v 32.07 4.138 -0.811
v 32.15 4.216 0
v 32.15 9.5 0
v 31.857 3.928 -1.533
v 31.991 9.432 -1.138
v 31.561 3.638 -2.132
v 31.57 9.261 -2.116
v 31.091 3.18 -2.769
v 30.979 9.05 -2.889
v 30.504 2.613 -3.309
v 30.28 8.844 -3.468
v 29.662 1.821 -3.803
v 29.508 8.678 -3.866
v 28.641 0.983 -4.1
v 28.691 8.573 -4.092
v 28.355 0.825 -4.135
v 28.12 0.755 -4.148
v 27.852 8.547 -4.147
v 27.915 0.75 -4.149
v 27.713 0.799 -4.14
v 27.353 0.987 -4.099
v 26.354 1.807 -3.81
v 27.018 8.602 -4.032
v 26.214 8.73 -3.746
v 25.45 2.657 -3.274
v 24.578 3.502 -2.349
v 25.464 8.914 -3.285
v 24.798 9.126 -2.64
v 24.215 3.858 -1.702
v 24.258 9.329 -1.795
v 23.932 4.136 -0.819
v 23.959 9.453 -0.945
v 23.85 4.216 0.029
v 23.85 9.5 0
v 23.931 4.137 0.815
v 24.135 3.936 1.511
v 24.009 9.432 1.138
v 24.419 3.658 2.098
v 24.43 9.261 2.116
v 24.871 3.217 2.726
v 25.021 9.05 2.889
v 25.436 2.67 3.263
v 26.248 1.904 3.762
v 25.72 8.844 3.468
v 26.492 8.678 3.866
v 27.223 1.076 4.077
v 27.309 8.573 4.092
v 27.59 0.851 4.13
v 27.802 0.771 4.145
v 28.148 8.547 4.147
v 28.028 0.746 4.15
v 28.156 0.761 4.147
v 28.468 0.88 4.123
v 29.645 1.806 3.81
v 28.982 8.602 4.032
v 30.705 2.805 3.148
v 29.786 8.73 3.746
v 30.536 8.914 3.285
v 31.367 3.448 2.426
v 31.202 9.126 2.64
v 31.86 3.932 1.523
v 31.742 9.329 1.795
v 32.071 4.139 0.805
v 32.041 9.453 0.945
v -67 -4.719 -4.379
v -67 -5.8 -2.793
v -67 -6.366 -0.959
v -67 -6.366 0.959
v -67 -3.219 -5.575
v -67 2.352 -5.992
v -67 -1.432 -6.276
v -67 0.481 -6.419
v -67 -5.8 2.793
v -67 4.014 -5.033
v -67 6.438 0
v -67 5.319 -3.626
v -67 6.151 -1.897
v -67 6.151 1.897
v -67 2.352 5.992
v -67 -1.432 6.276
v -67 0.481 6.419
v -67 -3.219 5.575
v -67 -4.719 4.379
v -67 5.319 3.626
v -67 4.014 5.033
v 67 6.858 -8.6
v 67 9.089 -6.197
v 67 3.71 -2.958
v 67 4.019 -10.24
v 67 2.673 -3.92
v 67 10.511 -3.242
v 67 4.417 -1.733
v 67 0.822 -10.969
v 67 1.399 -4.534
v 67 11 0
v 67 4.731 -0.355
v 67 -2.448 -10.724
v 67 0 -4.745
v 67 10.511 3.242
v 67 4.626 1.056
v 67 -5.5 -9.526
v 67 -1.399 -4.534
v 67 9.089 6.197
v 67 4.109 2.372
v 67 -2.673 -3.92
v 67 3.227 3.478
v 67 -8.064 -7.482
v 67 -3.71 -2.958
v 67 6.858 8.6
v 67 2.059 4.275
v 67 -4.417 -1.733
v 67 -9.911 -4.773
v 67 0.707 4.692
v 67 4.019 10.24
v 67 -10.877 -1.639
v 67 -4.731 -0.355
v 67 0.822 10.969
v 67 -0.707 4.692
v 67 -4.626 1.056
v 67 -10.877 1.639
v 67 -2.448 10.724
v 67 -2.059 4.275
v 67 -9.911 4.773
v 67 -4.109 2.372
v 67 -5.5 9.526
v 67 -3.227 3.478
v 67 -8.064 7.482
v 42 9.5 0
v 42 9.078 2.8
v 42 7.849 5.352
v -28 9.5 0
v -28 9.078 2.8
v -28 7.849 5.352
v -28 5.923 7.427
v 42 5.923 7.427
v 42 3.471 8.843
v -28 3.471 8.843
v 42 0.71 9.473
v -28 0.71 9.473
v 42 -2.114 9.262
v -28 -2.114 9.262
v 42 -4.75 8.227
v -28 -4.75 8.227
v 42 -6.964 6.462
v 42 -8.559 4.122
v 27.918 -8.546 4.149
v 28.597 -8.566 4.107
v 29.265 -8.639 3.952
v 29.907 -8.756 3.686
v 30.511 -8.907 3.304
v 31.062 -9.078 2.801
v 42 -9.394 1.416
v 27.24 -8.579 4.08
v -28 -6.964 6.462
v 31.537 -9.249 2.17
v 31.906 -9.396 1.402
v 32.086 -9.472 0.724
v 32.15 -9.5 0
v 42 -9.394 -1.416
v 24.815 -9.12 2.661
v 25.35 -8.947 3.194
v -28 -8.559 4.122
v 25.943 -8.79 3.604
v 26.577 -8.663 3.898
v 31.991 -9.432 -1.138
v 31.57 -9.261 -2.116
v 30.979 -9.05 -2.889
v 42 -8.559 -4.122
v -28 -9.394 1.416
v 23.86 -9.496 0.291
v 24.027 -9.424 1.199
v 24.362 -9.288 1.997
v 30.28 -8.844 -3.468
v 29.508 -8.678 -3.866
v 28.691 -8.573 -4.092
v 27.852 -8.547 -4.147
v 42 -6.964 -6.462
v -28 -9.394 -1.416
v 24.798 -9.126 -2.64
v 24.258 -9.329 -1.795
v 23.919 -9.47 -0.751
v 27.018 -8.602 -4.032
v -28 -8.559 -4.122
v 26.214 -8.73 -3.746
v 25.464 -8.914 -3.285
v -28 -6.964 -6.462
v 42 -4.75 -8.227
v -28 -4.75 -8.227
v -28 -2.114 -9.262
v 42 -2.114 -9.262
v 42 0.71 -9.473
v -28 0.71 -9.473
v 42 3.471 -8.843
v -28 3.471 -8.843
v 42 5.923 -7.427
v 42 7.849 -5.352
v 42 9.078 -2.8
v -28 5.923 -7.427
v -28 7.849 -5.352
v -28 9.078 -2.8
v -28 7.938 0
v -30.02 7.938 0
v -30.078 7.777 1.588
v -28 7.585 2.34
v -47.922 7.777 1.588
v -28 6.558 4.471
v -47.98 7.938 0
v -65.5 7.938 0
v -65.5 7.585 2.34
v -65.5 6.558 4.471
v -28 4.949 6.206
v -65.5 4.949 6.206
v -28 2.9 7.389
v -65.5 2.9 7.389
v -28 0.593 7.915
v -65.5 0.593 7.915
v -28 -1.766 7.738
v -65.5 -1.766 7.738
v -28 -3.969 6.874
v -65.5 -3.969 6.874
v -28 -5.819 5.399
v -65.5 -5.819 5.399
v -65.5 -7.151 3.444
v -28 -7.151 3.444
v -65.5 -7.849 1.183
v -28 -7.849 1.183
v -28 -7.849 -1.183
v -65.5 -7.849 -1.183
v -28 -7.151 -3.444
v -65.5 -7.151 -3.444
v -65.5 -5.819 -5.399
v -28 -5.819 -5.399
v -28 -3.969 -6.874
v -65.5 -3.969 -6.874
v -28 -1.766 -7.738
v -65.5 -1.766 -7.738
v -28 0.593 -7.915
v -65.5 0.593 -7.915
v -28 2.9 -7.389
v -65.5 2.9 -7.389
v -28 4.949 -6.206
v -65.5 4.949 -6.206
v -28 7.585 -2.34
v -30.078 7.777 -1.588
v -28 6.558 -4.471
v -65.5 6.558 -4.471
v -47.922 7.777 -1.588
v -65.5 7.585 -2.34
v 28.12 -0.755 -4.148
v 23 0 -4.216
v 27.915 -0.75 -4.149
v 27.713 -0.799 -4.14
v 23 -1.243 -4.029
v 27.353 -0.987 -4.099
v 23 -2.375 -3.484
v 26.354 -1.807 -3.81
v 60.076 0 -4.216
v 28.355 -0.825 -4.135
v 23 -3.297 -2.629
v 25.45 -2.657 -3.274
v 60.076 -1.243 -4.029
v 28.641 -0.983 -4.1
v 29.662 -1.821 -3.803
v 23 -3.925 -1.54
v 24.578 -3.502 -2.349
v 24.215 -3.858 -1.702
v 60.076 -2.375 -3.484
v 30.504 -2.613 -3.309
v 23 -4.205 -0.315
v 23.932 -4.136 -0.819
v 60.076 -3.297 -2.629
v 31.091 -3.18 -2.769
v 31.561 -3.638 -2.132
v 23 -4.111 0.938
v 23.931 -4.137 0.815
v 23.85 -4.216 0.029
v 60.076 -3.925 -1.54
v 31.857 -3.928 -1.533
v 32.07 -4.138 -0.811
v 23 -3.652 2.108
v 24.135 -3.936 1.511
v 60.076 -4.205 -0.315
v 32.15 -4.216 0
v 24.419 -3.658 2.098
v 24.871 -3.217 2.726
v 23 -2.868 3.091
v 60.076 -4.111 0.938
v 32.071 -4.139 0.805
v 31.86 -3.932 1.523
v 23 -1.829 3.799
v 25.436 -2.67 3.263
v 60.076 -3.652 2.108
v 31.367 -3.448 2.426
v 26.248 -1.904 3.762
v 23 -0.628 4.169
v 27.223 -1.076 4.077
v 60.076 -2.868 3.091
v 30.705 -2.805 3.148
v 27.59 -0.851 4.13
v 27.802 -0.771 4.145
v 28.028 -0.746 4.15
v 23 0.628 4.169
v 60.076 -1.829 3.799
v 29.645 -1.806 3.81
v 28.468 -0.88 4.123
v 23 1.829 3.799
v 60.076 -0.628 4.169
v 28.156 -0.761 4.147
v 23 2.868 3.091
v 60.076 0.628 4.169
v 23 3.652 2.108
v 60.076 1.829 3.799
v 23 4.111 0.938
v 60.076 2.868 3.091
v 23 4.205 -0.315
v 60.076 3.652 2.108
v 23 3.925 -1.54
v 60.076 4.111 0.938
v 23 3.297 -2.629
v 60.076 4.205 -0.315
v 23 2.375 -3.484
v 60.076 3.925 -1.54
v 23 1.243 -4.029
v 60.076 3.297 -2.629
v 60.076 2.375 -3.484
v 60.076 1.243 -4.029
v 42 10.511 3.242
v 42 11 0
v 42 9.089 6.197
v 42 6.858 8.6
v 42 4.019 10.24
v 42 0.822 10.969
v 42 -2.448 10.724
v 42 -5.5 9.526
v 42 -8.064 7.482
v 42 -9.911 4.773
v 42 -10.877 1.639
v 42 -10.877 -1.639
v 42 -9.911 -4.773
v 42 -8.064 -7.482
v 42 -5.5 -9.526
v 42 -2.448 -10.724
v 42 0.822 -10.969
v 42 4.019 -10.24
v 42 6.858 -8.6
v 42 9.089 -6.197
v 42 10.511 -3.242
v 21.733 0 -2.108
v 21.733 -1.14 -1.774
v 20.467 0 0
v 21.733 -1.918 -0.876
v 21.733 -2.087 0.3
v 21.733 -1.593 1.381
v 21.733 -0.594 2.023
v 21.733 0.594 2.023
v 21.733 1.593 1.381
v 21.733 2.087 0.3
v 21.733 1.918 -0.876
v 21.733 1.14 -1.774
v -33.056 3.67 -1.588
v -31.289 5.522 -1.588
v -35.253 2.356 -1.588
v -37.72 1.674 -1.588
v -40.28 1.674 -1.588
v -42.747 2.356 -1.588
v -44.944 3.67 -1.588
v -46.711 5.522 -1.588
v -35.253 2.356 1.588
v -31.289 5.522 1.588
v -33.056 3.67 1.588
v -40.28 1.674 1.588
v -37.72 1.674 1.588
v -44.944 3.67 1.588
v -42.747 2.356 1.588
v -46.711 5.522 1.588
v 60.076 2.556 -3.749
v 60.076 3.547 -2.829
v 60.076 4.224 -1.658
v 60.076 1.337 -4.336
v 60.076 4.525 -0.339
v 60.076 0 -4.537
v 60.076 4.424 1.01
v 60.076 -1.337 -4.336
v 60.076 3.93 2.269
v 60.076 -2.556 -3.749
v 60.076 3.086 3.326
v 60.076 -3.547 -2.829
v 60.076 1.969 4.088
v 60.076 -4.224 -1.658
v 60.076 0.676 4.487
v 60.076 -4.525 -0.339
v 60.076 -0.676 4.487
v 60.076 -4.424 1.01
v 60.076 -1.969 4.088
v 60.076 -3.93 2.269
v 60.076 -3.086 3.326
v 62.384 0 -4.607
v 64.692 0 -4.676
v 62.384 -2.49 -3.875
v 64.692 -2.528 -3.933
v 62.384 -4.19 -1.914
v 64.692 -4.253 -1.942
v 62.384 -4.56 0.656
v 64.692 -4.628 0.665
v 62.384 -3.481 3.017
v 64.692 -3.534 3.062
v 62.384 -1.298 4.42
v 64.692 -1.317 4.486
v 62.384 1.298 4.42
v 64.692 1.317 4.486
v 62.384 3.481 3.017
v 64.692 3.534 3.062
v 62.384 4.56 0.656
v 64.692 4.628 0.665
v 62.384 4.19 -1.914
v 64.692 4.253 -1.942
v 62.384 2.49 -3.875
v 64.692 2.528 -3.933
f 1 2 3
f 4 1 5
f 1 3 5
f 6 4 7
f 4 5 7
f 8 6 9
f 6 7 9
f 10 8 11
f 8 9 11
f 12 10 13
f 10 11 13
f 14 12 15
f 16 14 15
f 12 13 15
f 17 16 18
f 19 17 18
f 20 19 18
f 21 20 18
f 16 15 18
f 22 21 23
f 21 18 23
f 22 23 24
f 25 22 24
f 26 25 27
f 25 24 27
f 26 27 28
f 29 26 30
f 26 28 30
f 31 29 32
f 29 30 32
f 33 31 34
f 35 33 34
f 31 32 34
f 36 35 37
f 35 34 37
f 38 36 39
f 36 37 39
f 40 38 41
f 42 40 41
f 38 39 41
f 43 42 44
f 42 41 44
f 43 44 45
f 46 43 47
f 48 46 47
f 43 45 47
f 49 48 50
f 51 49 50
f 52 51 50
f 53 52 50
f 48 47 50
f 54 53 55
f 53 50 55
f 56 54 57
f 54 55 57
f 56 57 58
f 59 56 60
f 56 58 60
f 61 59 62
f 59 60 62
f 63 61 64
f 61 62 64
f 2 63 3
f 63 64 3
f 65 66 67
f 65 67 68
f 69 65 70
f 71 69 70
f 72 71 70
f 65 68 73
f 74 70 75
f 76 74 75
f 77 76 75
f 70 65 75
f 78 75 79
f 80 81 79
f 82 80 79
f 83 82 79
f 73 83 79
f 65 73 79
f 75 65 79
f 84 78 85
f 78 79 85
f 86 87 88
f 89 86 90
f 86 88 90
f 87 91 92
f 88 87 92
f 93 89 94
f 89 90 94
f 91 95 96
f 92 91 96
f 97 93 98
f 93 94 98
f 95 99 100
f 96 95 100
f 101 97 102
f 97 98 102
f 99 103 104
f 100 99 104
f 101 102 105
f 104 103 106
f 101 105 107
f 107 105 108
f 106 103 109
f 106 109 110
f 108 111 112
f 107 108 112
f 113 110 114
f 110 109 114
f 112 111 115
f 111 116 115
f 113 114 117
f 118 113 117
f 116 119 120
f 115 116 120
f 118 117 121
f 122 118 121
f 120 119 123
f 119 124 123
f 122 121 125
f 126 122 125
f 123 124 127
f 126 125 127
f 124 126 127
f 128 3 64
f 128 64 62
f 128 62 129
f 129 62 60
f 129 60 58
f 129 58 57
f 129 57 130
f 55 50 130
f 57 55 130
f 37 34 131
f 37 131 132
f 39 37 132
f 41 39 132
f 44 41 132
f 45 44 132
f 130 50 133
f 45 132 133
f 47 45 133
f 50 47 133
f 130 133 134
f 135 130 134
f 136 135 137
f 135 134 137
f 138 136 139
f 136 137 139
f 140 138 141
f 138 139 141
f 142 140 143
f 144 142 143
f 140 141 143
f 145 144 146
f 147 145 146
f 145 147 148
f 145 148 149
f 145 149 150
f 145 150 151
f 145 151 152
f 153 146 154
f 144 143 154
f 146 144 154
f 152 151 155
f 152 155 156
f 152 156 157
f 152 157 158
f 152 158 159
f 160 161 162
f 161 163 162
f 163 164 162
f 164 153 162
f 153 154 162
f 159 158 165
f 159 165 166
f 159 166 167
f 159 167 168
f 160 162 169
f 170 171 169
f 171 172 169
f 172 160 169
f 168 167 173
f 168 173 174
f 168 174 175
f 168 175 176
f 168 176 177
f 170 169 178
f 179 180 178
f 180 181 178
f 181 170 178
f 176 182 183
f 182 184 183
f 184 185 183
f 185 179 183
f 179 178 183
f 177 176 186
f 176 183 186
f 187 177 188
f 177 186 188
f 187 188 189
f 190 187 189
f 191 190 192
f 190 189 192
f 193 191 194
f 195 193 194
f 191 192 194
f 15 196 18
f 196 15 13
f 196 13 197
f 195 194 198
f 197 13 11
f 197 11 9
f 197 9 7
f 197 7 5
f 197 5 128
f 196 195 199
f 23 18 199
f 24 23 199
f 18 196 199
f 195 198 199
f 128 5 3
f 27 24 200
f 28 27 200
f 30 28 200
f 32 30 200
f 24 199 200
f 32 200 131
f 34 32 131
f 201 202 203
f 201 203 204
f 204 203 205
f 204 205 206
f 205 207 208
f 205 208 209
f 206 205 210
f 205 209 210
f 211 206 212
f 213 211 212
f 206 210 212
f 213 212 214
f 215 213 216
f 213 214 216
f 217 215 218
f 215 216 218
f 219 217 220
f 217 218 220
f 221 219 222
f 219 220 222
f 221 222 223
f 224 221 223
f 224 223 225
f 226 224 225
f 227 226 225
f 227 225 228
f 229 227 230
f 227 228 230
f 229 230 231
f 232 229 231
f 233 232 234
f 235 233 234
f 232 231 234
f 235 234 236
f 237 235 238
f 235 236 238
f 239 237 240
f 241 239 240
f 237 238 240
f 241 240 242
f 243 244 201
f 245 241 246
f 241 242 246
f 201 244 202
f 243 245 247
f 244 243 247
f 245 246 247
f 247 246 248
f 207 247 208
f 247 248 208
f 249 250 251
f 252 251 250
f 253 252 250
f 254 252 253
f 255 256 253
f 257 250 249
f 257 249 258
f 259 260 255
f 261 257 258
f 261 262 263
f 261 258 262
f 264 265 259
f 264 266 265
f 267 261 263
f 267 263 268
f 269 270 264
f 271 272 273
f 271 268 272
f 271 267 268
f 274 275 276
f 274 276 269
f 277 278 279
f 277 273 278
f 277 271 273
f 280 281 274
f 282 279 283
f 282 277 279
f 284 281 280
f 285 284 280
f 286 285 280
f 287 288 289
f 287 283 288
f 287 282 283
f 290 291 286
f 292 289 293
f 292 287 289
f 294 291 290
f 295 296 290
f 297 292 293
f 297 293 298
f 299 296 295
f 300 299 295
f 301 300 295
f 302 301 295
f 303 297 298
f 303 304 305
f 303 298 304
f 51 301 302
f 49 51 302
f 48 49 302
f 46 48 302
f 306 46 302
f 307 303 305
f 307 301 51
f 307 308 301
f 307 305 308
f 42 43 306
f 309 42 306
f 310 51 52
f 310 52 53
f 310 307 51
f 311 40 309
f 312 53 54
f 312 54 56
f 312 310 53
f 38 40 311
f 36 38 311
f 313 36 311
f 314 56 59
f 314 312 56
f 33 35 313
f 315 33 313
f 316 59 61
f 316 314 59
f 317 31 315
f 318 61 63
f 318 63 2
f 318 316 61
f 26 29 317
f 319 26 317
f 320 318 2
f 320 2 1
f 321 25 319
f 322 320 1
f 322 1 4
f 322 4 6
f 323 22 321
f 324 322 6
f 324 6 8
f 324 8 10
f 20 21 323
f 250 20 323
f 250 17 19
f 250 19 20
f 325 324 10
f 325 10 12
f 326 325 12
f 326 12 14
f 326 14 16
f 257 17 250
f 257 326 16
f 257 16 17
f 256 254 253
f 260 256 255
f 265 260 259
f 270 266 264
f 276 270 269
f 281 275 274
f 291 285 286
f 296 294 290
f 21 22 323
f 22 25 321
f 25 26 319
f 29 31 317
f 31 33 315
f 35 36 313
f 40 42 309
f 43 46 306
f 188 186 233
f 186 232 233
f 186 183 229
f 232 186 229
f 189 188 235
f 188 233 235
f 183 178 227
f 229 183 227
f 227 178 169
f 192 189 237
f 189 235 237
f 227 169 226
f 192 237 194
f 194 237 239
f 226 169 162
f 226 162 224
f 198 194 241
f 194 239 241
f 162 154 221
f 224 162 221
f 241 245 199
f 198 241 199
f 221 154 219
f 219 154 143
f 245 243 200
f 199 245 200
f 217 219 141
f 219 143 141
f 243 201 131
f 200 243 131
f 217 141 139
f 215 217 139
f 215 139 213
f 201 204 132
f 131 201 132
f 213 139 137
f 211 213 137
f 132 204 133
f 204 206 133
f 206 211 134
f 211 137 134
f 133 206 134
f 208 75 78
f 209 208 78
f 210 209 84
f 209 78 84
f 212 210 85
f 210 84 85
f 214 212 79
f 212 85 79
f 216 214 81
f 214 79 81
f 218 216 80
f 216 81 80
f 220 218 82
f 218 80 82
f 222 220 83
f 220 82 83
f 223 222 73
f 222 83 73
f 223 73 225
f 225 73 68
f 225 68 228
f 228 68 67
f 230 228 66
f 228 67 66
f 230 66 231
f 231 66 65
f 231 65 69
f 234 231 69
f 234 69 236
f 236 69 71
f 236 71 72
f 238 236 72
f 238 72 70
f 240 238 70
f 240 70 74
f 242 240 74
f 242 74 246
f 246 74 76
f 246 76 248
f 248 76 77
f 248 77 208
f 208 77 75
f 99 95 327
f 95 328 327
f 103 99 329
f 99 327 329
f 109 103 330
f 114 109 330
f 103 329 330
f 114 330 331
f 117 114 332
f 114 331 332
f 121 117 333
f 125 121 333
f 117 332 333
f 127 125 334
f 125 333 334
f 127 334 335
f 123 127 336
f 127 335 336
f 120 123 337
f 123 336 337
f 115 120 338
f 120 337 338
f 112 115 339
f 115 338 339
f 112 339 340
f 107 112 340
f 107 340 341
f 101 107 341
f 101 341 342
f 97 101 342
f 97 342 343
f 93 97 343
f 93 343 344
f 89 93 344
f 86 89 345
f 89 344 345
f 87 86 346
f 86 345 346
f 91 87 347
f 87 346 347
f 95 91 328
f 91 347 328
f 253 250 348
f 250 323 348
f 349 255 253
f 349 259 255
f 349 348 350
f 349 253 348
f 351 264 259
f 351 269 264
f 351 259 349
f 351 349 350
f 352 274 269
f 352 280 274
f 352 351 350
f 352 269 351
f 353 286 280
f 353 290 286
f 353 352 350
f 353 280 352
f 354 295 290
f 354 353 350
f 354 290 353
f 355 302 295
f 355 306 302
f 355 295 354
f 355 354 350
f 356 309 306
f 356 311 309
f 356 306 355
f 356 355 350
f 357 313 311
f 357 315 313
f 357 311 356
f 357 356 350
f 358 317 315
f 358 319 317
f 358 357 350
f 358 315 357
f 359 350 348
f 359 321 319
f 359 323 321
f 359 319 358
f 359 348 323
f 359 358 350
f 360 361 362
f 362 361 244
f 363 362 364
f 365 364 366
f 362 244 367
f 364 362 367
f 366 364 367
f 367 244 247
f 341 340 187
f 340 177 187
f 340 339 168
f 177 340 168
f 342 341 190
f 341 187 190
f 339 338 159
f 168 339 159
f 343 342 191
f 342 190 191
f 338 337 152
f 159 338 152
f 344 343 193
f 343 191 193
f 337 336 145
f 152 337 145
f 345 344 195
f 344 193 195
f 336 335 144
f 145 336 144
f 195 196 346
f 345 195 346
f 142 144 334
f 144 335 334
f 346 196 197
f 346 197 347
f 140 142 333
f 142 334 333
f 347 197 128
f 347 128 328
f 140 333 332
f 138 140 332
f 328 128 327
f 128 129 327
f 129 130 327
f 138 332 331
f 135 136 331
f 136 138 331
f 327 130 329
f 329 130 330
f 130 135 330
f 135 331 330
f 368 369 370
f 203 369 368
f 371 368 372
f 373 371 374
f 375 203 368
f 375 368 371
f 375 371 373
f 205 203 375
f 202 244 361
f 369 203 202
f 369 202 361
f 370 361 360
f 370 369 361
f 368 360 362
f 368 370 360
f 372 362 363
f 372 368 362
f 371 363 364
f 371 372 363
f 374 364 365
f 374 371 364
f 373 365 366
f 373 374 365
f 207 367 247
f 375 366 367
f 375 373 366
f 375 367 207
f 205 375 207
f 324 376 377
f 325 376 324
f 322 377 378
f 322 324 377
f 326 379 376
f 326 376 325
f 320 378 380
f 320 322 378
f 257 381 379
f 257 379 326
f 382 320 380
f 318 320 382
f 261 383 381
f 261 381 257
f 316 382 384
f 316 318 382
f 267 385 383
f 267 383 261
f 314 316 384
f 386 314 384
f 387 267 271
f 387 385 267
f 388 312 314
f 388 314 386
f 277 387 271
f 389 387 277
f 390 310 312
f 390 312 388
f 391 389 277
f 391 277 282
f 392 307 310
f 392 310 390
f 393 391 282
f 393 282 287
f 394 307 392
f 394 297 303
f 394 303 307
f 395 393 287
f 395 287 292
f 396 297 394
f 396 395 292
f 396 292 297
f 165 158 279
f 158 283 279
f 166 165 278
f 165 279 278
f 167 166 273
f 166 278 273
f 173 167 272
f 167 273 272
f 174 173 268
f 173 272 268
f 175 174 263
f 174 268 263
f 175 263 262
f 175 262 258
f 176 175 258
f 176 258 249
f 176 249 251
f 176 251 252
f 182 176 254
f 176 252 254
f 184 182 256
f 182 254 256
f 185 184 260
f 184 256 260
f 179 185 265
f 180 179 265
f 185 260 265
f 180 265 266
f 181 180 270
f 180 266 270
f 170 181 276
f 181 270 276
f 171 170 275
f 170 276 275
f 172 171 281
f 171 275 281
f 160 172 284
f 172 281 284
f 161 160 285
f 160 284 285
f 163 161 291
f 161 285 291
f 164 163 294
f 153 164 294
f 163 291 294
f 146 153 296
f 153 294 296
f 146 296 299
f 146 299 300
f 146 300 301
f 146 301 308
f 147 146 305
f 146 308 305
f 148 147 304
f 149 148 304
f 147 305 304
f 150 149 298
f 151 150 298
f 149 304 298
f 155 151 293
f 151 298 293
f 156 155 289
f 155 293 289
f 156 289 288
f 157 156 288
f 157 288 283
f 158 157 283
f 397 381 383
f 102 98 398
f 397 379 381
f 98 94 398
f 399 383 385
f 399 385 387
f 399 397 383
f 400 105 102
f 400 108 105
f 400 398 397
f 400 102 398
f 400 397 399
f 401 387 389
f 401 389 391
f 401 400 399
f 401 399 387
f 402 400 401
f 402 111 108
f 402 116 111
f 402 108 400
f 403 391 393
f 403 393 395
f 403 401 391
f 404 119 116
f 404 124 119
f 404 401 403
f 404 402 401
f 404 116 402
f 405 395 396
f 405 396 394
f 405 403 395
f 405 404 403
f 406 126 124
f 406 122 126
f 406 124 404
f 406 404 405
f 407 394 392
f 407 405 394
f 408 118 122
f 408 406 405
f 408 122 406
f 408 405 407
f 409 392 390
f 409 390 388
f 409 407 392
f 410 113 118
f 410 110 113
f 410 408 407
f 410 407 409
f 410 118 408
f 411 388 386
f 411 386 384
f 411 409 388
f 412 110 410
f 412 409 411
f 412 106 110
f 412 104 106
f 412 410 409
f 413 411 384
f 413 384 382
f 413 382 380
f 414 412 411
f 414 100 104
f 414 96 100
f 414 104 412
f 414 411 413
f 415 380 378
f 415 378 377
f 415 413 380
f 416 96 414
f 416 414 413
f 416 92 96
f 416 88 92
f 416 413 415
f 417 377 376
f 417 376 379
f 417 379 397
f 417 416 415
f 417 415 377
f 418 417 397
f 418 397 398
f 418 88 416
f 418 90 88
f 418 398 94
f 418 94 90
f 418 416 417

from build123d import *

# Parameters (mm, degrees)
SKETCH4_R          = 4.15
CUT_EXTRUDE1_DEPTH = 15
CHAMFER1_SIZE      = 1.5
CUT_EXTRUDE2_DEPTH = 1.5875


with BuildPart() as part:
    # Sketch1 → Revolve1 (revolve)
    with BuildSketch(Plane.XY):
        Polygon((-67, 0), (67, 0), (67, 11), (42, 11), (42, 9.5), (-28, 9.5), (-28, 7.9375), (-67, 7.9375), align=None)
    revolve(axis=Axis((-84.93546187, 0, 0), (1, 0, 0)))

    # Sketch2 → 1/8 NPT Tapped Hole1 (revolve, cut)
    with BuildSketch(Plane(origin=(67, 0, 0), x_dir=(0, 0, -1), z_dir=(0, 1, 0))):
        Polygon((0, 0), (0, 46.533468714), (4.2164, 44), (4.2164, 6.92404), (4.53740497, 6.92404), (4.74472, 0), align=None)
    revolve(axis=Axis((73.35, 0, 0), (-1, 0, 0)), mode=Mode.SUBTRACT)

    # Sketch4 → Cut-Extrude1 (cut, symmetric)
    with BuildSketch(Plane(origin=(0, 0, 0), x_dir=(1, 0, 0), z_dir=(0, 1, 0))):
        with Locations((28, 0)):
            Circle(SKETCH4_R)
    extrude(amount=CUT_EXTRUDE1_DEPTH, both=True, mode=Mode.SUBTRACT)

    # Chamfer1
    chamfer1_edges = [part.edges().sort_by_distance(p)[0] for p in [
        (-67, -7.9375, 0),
    ]]
    chamfer(chamfer1_edges, length=CHAMFER1_SIZE)

    # Sketch7 → Cut-Extrude2 (cut, symmetric)
    with BuildSketch(Plane.XY):
        with BuildLine():
            Line((-48.391776656, 9.525), (-29.608223344, 9.525))
            ThreePointArc((-29.608223344, 9.525), (-39, 1.5875), (-48.391776656, 9.525))
        make_face()
    extrude(amount=CUT_EXTRUDE2_DEPTH, both=True, mode=Mode.SUBTRACT)


solid = part.part
